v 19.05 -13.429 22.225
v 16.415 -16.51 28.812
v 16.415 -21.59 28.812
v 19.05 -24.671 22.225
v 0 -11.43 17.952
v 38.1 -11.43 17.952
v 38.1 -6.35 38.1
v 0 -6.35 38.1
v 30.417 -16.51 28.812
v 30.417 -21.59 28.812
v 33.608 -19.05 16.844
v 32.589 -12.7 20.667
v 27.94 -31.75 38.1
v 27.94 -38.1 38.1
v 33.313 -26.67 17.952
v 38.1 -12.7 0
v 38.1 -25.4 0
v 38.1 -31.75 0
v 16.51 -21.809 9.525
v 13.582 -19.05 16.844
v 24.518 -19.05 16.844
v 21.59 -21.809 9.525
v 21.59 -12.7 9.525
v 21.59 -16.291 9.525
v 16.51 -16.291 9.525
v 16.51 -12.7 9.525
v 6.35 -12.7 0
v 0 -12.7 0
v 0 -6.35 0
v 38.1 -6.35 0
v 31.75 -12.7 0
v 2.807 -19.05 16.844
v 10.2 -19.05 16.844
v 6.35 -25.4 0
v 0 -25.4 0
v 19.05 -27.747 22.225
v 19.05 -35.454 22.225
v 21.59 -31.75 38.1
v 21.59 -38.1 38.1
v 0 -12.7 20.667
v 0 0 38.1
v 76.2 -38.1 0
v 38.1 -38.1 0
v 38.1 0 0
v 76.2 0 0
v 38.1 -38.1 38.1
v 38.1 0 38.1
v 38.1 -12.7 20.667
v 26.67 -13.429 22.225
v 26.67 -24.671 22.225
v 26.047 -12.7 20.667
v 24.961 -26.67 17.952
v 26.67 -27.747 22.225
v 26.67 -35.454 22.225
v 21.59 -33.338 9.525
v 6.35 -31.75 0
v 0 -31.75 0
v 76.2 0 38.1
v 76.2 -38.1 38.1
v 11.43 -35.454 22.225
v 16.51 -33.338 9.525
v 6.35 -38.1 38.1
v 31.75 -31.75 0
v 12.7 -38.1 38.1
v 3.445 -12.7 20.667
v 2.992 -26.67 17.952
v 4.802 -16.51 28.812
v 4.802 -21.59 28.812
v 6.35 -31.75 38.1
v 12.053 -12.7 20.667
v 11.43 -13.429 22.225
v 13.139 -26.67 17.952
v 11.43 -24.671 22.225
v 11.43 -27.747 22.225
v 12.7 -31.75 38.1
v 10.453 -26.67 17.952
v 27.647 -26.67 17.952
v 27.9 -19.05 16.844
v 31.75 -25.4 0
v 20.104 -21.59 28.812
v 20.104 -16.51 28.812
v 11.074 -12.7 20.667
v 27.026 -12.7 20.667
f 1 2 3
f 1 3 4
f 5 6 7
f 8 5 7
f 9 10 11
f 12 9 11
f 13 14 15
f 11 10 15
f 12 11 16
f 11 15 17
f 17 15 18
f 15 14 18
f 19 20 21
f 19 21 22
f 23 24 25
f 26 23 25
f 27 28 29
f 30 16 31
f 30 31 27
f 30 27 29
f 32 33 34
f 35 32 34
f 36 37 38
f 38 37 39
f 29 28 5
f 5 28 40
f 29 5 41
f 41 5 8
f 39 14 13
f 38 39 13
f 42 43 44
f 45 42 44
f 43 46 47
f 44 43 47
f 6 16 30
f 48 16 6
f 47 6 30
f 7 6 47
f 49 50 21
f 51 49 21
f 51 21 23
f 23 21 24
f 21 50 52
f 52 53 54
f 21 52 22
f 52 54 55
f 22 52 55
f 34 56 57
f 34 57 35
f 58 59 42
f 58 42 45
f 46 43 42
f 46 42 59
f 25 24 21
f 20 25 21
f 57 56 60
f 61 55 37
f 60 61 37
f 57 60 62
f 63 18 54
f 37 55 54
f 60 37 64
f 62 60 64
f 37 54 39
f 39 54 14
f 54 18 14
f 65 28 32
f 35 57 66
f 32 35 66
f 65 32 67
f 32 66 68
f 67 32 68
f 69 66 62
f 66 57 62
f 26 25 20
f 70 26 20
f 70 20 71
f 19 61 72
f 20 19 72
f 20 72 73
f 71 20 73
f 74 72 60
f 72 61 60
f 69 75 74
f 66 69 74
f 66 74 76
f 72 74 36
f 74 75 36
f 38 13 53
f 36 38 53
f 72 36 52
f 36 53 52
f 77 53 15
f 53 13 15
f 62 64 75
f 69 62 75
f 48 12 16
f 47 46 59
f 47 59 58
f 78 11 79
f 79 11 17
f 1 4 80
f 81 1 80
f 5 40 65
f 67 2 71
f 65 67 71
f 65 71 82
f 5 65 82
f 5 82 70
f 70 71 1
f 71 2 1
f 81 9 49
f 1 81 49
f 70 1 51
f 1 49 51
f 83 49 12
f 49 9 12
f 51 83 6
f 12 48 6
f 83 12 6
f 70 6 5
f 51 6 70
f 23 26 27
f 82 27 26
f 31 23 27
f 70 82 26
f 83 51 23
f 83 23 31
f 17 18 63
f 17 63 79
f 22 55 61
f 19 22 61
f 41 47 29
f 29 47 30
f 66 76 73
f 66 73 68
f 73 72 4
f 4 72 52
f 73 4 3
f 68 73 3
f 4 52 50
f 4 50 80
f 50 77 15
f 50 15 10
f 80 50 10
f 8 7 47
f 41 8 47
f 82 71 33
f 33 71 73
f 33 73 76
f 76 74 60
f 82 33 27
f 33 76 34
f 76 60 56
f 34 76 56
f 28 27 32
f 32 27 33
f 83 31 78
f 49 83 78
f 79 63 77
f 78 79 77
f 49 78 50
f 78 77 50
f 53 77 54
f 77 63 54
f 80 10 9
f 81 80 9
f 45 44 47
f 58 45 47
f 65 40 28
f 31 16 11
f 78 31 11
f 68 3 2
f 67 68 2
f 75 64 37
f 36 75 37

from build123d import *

# Parameters (mm, degrees)
F2_W     = 38.1
F2_H     = 38.1
F3_DEPTH = 38.1
F5_DEPTH = 38.1
F6_DEPTH = 38.1
F8_DEPTH = 25.4


with BuildPart() as f3:
    # F2 (on offset) → F3 (new body)
    with BuildSketch(Plane.YZ.offset(38.1)):
        with Locations((-19.05, 19.05)):
            Rectangle(F2_W, F2_H)
    extrude(amount=F3_DEPTH)


with BuildPart() as f5:
    # F2 (on offset) → F5 (new body)
    with BuildSketch(Plane.YZ.offset(38.1)):
        with Locations((-19.05, 19.05)):
            Rectangle(F2_W, F2_H)
    extrude(amount=-F5_DEPTH)

    # F4 (on offset) → F6 (cut)
    with BuildSketch(Plane.YZ.offset(38.1)):
        Polygon((-6.35, 38.1), (-31.75, 38.1), (-26.67, 17.952383), (-21.59, 28.812464), (-16.51, 28.812464), (-11.43, 17.952383), align=None)
        Polygon((-31.75, 0), (-38.1, 38.1), (-38.1, 0), align=None)
        Polygon((-19.05, 16.844211), (-25.4, 0), (-12.7, 0), align=None)
        Polygon((0, 0), (0, 38.1), (-6.35, 0), align=None)
    extrude(amount=-F6_DEPTH, mode=Mode.SUBTRACT)

    # F7 (on offset) → F8 (cut)
    with BuildSketch(Plane.XZ.offset(38.1)):
        Polygon((0, 38.1), (0, 0), (6.35, 38.1), align=None)
        Polygon((21.59, 38.1), (12.7, 38.1), (19.05, 22.225), align=None)
        Polygon((27.94, 38.1), (38.1, 0), (38.1, 38.1), align=None)
        Polygon((11.43, 22.225), (6.35, 0), (31.75, 0), (26.67, 22.225), (21.59, 9.525), (16.51, 9.525), align=None)
    extrude(amount=-F8_DEPTH, mode=Mode.SUBTRACT)


solid = Compound([f3.part, f5.part])
